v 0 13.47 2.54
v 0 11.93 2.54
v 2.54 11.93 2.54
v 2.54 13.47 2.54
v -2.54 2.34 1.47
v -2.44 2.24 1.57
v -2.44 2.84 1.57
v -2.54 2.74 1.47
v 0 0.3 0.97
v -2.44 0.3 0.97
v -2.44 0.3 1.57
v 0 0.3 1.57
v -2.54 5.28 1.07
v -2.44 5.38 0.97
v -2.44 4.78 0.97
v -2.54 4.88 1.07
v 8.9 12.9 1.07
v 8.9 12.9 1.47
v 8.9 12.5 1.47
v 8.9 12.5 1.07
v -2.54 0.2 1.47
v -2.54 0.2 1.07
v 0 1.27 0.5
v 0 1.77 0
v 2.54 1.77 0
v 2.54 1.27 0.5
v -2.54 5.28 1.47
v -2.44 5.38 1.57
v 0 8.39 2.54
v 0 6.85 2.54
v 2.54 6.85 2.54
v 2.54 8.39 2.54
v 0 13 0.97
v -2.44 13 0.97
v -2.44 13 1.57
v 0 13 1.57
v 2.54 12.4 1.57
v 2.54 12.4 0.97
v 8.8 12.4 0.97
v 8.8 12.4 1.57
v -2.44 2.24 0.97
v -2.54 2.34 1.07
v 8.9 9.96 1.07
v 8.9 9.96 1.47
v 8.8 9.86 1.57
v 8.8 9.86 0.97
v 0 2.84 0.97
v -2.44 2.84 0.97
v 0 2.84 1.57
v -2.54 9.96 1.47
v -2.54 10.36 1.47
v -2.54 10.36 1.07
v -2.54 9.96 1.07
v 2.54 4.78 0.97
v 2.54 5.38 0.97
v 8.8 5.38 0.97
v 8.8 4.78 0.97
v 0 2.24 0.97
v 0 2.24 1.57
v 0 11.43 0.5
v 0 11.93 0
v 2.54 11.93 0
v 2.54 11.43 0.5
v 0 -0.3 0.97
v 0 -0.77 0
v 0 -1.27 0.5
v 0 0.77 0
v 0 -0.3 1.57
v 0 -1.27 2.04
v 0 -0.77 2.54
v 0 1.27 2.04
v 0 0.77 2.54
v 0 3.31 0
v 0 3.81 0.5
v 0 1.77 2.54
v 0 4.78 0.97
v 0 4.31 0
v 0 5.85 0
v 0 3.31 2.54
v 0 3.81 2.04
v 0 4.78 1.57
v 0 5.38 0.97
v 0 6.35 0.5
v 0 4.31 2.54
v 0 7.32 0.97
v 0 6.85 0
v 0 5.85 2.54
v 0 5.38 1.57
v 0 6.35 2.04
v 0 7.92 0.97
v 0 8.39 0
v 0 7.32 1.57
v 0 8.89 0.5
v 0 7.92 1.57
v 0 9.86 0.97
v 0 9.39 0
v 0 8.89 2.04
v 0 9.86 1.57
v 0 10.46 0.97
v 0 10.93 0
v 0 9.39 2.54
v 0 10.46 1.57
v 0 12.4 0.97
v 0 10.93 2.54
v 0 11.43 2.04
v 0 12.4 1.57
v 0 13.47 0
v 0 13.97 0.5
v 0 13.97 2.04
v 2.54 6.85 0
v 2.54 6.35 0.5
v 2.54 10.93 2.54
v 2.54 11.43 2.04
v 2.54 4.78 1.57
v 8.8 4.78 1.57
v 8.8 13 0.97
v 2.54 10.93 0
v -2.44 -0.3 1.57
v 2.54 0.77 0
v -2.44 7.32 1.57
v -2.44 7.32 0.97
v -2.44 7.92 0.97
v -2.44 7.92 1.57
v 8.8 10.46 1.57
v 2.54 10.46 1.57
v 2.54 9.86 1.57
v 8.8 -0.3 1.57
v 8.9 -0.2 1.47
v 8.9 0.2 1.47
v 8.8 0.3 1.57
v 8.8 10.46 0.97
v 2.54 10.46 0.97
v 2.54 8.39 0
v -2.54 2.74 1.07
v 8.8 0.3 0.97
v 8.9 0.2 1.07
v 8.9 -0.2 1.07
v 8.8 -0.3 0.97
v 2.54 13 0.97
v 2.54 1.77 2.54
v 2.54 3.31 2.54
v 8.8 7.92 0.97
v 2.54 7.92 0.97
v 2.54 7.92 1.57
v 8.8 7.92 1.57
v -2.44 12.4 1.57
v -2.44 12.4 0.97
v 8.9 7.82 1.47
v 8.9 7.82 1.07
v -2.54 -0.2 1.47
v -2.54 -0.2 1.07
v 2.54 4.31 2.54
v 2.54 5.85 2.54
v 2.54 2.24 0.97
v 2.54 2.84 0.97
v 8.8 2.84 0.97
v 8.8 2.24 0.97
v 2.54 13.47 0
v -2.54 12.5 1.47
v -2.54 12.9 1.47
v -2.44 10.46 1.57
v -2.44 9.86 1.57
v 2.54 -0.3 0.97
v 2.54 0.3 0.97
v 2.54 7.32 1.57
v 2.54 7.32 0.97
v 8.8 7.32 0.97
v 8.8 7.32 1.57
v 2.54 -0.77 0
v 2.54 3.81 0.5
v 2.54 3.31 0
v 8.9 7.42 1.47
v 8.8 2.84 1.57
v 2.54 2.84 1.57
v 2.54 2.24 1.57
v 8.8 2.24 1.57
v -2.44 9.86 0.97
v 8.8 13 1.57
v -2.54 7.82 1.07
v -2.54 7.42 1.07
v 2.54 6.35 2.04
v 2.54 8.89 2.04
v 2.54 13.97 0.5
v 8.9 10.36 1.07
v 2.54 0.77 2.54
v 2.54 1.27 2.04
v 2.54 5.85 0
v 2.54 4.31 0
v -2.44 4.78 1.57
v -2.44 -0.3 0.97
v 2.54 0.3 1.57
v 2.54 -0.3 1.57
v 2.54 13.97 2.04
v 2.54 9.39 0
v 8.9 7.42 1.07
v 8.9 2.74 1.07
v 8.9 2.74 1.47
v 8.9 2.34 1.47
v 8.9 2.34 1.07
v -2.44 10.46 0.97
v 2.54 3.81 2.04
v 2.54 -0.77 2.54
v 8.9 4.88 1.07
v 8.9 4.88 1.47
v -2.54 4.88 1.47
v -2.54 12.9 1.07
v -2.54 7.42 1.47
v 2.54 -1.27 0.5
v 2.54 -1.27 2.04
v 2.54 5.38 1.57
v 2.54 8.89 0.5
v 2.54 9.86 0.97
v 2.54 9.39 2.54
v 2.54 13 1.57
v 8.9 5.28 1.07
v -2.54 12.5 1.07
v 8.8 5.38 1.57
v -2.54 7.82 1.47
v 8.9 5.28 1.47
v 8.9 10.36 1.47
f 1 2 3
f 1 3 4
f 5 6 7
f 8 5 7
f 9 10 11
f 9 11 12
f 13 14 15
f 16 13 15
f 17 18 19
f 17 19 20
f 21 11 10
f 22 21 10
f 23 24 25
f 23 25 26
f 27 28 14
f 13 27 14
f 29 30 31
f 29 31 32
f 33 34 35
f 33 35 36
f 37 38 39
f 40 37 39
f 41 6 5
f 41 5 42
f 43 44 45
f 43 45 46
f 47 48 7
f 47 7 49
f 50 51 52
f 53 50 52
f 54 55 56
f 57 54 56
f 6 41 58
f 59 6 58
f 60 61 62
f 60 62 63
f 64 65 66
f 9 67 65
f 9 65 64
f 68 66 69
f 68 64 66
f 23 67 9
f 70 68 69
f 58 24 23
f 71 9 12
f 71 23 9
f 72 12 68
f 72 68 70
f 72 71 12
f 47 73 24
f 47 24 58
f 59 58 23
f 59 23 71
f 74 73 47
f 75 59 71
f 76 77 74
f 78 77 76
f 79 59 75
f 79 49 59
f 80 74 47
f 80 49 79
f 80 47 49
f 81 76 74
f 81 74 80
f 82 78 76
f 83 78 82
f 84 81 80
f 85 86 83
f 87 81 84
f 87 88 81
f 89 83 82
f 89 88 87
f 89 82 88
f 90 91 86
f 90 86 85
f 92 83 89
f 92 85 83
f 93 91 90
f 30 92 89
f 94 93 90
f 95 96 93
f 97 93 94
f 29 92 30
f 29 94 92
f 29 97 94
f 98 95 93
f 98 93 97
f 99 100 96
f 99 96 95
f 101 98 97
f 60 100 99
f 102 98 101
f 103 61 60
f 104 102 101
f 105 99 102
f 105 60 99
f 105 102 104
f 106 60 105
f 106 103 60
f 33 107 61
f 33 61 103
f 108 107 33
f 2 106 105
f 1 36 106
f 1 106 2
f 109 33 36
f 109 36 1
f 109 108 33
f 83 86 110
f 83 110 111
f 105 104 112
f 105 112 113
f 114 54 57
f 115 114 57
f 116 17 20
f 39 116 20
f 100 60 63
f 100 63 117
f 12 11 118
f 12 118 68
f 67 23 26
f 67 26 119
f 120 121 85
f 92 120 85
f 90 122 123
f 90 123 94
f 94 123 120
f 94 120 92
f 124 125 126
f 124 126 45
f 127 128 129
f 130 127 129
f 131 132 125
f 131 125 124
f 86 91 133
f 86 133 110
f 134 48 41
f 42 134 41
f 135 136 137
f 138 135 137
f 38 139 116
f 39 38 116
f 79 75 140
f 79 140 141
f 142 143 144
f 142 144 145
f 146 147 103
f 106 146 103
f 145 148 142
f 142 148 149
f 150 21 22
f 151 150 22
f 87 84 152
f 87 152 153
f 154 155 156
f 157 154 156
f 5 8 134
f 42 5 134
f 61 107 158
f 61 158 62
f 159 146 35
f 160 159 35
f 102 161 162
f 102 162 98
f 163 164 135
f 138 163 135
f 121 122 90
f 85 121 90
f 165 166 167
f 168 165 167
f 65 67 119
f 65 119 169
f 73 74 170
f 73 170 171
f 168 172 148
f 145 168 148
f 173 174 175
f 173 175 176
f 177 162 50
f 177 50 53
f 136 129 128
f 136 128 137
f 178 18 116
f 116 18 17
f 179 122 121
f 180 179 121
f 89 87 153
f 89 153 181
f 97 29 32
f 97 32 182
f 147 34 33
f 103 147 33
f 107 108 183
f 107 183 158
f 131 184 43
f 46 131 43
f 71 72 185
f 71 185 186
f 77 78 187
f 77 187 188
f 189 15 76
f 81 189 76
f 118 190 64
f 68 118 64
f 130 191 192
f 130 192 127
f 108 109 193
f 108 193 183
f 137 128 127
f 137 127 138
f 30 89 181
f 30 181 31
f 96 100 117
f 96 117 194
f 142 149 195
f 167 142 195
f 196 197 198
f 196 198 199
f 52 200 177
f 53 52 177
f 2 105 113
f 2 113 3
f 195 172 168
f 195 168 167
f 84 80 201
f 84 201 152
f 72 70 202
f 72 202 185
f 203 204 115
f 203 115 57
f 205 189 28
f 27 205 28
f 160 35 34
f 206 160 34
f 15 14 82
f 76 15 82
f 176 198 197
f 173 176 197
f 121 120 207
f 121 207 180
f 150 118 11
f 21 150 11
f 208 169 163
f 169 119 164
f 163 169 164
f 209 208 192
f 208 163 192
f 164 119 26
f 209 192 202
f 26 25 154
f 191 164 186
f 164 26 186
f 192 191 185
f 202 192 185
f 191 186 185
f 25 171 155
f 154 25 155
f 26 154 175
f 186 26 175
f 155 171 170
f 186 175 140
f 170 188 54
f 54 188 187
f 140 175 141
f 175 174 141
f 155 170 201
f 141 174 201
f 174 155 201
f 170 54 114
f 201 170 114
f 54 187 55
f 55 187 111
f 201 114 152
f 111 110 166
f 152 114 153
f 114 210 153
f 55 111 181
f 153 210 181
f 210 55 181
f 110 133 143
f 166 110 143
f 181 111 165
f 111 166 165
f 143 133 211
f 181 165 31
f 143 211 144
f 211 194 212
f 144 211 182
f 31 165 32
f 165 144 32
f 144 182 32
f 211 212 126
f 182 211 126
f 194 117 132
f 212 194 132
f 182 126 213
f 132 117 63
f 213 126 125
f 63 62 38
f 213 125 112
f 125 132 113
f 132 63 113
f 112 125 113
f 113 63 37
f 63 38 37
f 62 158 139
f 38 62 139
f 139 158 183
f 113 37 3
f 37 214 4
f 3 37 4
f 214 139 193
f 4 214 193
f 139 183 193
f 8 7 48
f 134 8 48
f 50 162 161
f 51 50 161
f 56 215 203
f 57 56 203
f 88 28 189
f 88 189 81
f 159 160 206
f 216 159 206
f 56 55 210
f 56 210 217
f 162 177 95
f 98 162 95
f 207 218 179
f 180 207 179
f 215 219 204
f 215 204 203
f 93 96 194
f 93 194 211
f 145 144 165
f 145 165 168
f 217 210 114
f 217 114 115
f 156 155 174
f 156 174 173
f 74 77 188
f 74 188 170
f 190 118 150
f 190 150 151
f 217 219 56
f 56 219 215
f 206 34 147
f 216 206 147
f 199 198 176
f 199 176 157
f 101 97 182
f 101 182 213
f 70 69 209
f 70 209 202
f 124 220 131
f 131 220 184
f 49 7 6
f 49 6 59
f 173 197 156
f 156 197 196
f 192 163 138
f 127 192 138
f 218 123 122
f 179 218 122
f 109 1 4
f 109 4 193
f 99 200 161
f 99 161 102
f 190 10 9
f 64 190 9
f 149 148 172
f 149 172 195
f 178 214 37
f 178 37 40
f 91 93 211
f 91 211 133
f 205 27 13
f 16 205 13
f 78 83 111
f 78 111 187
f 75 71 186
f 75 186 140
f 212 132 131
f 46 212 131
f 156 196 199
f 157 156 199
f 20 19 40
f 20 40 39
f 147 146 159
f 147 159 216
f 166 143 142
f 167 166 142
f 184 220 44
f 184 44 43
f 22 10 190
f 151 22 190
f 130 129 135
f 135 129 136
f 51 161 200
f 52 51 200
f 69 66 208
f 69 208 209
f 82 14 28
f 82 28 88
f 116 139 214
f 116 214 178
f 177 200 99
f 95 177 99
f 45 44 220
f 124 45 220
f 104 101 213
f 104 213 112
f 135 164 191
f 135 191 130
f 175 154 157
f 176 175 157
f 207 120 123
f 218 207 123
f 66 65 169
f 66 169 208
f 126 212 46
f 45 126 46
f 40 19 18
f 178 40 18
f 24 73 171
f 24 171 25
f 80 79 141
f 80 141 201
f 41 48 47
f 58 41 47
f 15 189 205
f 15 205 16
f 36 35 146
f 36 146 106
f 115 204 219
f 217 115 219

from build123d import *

# Parameters (mm, degrees)
PLASTIC_DEPTH   = 2.54
SKETCH2_W       = 11.44
SKETCH2_H       = 0.6
CONTACT_DEPTH   = 0.3
CHAMFER1_SIZE   = 0.1
LPATTERN1_COUNT = 6
LPATTERN1_PITCH = 2.54


with BuildPart() as part:
    # Sketch1 → Plastic (new body)
    with BuildSketch(Plane(origin=(0, 0, 0), x_dir=(0, 0, -1), z_dir=(1, 0, 0))):
        Polygon((-2.04, 1.27), (-0.5, 1.27), (0, 0.77), (0, -0.77), (-0.5, -1.27), (-2.04, -1.27), (-2.54, -0.77), (-2.54, 0.77), align=None)
    extrude(amount=PLASTIC_DEPTH)

    # Sketch2 → Contact (add, symmetric)
    with BuildSketch(Plane(origin=(0, 0, 0), x_dir=(1, 0, 0), z_dir=(0, 1, 0))):
        with Locations((3.18, -1.27)):
            Rectangle(SKETCH2_W, SKETCH2_H)
    extrude(amount=CONTACT_DEPTH, both=True)

    # Chamfer1
    chamfer1_edges = [part.edges().sort_by_distance(p)[0] for p in [
        (8.9, 0, 0.97),
        (8.9, 0.3, 1.27),
        (-2.54, 0, 1.57),
        (8.9, -0.3, 1.27),
        (8.9, 0, 1.57),
        (-2.54, -0.3, 1.27),
        (-2.54, 0, 0.97),
        (-2.54, 0.3, 1.27),
    ]]
    chamfer(chamfer1_edges, length=CHAMFER1_SIZE)

    # LPattern1: part ×6


with BuildPart() as part_1:
    add(part.part)
    with Locations(*[(0, i * LPATTERN1_PITCH, 0) for i in range(1, LPATTERN1_COUNT)]):
        add(part.part)


solid = part_1.part
